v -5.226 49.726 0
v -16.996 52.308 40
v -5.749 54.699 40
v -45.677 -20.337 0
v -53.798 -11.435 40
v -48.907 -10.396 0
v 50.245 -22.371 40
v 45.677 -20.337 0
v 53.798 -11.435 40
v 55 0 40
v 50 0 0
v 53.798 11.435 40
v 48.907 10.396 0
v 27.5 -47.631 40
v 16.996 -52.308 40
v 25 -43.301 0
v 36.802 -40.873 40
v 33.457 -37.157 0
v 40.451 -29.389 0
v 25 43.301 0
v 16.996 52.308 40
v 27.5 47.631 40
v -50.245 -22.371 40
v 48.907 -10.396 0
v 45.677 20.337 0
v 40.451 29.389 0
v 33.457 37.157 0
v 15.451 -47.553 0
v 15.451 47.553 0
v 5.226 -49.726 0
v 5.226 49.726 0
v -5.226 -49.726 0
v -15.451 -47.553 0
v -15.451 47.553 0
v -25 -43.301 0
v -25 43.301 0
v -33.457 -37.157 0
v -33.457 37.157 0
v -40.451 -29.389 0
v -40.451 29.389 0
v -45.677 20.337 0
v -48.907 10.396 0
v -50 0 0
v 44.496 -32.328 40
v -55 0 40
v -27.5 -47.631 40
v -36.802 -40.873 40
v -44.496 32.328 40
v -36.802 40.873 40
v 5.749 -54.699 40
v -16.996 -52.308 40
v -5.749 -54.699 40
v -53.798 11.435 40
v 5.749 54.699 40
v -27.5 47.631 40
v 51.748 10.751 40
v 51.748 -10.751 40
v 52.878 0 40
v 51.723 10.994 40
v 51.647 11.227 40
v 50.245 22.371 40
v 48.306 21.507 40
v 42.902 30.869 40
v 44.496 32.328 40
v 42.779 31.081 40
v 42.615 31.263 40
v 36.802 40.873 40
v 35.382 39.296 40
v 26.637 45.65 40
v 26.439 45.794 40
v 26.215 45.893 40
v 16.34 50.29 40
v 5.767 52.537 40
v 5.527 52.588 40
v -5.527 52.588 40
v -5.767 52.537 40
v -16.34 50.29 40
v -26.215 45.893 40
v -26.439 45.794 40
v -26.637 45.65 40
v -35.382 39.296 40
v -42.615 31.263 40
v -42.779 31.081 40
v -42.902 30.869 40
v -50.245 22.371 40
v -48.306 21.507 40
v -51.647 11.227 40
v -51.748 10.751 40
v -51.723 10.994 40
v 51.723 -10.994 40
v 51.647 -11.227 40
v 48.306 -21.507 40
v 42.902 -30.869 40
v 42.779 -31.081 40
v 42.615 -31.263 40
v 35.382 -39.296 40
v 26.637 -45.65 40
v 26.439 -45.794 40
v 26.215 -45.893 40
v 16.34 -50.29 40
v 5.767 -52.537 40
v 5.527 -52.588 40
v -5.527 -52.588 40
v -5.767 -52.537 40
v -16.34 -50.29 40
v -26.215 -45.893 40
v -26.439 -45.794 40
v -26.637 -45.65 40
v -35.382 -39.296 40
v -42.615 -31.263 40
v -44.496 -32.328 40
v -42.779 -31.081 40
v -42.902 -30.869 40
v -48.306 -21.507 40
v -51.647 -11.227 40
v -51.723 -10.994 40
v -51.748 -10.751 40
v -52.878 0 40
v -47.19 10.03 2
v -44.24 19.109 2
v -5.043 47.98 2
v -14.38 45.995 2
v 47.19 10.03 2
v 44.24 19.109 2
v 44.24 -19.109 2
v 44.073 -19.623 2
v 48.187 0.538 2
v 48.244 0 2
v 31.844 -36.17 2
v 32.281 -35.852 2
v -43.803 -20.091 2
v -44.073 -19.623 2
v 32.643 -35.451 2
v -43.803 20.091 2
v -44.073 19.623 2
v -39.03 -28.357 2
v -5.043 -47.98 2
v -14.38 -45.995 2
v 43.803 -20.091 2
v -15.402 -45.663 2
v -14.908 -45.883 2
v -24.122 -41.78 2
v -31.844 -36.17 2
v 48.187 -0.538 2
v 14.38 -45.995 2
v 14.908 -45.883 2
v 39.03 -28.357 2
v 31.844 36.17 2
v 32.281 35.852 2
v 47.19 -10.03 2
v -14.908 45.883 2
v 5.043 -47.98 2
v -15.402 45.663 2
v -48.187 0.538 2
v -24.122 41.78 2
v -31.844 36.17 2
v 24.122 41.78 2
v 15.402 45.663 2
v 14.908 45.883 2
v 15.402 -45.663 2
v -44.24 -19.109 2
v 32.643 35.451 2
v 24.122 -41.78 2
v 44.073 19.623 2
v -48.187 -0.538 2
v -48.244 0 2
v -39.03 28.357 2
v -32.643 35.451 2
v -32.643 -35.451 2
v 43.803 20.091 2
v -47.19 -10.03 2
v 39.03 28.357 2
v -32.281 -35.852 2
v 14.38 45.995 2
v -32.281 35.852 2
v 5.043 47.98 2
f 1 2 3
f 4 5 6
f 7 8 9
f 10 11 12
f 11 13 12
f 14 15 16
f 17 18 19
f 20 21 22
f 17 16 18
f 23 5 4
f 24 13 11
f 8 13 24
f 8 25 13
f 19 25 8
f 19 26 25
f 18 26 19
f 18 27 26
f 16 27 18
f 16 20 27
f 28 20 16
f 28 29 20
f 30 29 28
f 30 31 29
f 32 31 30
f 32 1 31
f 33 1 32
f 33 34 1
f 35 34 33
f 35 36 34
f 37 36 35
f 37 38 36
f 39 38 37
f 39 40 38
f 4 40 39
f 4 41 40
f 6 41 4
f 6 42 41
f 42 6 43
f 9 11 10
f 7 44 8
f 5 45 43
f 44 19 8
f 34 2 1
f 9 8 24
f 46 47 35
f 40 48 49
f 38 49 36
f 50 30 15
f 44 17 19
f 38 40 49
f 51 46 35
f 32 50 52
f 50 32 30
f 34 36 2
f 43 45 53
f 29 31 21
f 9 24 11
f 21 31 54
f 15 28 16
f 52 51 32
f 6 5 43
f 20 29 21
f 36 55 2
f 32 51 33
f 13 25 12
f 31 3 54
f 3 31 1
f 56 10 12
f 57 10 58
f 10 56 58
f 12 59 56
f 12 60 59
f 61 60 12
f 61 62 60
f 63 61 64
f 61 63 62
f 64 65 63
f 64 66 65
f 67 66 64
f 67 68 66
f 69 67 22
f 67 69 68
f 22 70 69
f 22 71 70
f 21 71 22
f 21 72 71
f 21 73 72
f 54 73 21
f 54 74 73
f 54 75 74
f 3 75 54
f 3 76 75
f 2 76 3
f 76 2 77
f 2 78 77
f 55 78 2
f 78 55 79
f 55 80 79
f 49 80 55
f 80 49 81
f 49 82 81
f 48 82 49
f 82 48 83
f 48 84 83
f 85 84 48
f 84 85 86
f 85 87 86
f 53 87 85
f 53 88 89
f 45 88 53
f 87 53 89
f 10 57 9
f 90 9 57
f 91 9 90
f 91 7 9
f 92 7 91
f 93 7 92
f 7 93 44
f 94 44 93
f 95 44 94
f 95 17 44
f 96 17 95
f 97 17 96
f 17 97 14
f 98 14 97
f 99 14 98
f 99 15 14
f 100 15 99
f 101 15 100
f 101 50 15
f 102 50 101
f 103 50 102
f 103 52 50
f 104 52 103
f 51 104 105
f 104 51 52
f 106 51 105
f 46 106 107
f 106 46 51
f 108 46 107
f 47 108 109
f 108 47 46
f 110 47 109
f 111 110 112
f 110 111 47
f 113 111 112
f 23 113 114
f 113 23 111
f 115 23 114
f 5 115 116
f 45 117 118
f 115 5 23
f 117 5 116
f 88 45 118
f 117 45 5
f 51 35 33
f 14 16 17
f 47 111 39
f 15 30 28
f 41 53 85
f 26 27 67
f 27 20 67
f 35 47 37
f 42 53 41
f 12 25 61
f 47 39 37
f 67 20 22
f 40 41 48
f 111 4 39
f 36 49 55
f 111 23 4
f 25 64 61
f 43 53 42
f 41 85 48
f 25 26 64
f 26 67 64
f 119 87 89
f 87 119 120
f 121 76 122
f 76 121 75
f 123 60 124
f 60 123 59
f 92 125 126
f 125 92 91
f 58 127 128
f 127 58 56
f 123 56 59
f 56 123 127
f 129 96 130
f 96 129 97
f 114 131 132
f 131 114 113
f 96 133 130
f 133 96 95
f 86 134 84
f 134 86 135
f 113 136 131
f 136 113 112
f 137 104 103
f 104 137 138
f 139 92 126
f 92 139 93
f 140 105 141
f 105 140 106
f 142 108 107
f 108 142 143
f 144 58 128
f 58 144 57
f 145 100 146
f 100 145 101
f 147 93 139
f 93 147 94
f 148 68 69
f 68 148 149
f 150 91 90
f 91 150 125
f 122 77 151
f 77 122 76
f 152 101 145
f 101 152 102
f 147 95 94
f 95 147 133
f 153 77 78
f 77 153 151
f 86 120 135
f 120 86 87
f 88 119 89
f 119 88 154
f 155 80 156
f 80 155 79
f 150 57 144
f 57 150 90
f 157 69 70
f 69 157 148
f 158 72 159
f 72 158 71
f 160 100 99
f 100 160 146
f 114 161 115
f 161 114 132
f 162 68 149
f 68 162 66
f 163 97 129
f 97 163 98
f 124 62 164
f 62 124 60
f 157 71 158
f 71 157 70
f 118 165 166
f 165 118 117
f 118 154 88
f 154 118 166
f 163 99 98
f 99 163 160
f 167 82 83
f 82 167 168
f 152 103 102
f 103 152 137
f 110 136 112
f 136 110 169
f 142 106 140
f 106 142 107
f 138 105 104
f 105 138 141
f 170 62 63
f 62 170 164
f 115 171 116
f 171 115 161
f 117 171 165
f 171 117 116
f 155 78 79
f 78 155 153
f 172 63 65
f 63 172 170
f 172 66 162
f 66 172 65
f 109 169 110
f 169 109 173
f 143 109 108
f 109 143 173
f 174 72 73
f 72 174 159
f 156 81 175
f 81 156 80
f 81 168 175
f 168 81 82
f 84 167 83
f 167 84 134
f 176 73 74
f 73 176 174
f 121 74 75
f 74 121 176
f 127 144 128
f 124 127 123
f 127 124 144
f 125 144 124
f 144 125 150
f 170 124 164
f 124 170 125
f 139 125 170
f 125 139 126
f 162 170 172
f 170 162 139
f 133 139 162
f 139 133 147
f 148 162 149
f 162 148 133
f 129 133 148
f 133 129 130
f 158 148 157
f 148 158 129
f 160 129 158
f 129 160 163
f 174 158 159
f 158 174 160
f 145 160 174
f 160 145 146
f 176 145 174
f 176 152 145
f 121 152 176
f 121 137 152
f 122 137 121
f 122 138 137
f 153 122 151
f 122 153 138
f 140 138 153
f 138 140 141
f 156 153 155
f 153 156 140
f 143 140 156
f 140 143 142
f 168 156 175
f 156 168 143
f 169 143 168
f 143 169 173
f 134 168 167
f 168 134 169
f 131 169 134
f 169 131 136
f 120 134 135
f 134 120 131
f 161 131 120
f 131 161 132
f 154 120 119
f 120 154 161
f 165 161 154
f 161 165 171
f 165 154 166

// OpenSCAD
cylinder(2, 50, 50);
difference(){
    cylinder(40, 50, 55);
    cylinder(41, 48, 53);
}
